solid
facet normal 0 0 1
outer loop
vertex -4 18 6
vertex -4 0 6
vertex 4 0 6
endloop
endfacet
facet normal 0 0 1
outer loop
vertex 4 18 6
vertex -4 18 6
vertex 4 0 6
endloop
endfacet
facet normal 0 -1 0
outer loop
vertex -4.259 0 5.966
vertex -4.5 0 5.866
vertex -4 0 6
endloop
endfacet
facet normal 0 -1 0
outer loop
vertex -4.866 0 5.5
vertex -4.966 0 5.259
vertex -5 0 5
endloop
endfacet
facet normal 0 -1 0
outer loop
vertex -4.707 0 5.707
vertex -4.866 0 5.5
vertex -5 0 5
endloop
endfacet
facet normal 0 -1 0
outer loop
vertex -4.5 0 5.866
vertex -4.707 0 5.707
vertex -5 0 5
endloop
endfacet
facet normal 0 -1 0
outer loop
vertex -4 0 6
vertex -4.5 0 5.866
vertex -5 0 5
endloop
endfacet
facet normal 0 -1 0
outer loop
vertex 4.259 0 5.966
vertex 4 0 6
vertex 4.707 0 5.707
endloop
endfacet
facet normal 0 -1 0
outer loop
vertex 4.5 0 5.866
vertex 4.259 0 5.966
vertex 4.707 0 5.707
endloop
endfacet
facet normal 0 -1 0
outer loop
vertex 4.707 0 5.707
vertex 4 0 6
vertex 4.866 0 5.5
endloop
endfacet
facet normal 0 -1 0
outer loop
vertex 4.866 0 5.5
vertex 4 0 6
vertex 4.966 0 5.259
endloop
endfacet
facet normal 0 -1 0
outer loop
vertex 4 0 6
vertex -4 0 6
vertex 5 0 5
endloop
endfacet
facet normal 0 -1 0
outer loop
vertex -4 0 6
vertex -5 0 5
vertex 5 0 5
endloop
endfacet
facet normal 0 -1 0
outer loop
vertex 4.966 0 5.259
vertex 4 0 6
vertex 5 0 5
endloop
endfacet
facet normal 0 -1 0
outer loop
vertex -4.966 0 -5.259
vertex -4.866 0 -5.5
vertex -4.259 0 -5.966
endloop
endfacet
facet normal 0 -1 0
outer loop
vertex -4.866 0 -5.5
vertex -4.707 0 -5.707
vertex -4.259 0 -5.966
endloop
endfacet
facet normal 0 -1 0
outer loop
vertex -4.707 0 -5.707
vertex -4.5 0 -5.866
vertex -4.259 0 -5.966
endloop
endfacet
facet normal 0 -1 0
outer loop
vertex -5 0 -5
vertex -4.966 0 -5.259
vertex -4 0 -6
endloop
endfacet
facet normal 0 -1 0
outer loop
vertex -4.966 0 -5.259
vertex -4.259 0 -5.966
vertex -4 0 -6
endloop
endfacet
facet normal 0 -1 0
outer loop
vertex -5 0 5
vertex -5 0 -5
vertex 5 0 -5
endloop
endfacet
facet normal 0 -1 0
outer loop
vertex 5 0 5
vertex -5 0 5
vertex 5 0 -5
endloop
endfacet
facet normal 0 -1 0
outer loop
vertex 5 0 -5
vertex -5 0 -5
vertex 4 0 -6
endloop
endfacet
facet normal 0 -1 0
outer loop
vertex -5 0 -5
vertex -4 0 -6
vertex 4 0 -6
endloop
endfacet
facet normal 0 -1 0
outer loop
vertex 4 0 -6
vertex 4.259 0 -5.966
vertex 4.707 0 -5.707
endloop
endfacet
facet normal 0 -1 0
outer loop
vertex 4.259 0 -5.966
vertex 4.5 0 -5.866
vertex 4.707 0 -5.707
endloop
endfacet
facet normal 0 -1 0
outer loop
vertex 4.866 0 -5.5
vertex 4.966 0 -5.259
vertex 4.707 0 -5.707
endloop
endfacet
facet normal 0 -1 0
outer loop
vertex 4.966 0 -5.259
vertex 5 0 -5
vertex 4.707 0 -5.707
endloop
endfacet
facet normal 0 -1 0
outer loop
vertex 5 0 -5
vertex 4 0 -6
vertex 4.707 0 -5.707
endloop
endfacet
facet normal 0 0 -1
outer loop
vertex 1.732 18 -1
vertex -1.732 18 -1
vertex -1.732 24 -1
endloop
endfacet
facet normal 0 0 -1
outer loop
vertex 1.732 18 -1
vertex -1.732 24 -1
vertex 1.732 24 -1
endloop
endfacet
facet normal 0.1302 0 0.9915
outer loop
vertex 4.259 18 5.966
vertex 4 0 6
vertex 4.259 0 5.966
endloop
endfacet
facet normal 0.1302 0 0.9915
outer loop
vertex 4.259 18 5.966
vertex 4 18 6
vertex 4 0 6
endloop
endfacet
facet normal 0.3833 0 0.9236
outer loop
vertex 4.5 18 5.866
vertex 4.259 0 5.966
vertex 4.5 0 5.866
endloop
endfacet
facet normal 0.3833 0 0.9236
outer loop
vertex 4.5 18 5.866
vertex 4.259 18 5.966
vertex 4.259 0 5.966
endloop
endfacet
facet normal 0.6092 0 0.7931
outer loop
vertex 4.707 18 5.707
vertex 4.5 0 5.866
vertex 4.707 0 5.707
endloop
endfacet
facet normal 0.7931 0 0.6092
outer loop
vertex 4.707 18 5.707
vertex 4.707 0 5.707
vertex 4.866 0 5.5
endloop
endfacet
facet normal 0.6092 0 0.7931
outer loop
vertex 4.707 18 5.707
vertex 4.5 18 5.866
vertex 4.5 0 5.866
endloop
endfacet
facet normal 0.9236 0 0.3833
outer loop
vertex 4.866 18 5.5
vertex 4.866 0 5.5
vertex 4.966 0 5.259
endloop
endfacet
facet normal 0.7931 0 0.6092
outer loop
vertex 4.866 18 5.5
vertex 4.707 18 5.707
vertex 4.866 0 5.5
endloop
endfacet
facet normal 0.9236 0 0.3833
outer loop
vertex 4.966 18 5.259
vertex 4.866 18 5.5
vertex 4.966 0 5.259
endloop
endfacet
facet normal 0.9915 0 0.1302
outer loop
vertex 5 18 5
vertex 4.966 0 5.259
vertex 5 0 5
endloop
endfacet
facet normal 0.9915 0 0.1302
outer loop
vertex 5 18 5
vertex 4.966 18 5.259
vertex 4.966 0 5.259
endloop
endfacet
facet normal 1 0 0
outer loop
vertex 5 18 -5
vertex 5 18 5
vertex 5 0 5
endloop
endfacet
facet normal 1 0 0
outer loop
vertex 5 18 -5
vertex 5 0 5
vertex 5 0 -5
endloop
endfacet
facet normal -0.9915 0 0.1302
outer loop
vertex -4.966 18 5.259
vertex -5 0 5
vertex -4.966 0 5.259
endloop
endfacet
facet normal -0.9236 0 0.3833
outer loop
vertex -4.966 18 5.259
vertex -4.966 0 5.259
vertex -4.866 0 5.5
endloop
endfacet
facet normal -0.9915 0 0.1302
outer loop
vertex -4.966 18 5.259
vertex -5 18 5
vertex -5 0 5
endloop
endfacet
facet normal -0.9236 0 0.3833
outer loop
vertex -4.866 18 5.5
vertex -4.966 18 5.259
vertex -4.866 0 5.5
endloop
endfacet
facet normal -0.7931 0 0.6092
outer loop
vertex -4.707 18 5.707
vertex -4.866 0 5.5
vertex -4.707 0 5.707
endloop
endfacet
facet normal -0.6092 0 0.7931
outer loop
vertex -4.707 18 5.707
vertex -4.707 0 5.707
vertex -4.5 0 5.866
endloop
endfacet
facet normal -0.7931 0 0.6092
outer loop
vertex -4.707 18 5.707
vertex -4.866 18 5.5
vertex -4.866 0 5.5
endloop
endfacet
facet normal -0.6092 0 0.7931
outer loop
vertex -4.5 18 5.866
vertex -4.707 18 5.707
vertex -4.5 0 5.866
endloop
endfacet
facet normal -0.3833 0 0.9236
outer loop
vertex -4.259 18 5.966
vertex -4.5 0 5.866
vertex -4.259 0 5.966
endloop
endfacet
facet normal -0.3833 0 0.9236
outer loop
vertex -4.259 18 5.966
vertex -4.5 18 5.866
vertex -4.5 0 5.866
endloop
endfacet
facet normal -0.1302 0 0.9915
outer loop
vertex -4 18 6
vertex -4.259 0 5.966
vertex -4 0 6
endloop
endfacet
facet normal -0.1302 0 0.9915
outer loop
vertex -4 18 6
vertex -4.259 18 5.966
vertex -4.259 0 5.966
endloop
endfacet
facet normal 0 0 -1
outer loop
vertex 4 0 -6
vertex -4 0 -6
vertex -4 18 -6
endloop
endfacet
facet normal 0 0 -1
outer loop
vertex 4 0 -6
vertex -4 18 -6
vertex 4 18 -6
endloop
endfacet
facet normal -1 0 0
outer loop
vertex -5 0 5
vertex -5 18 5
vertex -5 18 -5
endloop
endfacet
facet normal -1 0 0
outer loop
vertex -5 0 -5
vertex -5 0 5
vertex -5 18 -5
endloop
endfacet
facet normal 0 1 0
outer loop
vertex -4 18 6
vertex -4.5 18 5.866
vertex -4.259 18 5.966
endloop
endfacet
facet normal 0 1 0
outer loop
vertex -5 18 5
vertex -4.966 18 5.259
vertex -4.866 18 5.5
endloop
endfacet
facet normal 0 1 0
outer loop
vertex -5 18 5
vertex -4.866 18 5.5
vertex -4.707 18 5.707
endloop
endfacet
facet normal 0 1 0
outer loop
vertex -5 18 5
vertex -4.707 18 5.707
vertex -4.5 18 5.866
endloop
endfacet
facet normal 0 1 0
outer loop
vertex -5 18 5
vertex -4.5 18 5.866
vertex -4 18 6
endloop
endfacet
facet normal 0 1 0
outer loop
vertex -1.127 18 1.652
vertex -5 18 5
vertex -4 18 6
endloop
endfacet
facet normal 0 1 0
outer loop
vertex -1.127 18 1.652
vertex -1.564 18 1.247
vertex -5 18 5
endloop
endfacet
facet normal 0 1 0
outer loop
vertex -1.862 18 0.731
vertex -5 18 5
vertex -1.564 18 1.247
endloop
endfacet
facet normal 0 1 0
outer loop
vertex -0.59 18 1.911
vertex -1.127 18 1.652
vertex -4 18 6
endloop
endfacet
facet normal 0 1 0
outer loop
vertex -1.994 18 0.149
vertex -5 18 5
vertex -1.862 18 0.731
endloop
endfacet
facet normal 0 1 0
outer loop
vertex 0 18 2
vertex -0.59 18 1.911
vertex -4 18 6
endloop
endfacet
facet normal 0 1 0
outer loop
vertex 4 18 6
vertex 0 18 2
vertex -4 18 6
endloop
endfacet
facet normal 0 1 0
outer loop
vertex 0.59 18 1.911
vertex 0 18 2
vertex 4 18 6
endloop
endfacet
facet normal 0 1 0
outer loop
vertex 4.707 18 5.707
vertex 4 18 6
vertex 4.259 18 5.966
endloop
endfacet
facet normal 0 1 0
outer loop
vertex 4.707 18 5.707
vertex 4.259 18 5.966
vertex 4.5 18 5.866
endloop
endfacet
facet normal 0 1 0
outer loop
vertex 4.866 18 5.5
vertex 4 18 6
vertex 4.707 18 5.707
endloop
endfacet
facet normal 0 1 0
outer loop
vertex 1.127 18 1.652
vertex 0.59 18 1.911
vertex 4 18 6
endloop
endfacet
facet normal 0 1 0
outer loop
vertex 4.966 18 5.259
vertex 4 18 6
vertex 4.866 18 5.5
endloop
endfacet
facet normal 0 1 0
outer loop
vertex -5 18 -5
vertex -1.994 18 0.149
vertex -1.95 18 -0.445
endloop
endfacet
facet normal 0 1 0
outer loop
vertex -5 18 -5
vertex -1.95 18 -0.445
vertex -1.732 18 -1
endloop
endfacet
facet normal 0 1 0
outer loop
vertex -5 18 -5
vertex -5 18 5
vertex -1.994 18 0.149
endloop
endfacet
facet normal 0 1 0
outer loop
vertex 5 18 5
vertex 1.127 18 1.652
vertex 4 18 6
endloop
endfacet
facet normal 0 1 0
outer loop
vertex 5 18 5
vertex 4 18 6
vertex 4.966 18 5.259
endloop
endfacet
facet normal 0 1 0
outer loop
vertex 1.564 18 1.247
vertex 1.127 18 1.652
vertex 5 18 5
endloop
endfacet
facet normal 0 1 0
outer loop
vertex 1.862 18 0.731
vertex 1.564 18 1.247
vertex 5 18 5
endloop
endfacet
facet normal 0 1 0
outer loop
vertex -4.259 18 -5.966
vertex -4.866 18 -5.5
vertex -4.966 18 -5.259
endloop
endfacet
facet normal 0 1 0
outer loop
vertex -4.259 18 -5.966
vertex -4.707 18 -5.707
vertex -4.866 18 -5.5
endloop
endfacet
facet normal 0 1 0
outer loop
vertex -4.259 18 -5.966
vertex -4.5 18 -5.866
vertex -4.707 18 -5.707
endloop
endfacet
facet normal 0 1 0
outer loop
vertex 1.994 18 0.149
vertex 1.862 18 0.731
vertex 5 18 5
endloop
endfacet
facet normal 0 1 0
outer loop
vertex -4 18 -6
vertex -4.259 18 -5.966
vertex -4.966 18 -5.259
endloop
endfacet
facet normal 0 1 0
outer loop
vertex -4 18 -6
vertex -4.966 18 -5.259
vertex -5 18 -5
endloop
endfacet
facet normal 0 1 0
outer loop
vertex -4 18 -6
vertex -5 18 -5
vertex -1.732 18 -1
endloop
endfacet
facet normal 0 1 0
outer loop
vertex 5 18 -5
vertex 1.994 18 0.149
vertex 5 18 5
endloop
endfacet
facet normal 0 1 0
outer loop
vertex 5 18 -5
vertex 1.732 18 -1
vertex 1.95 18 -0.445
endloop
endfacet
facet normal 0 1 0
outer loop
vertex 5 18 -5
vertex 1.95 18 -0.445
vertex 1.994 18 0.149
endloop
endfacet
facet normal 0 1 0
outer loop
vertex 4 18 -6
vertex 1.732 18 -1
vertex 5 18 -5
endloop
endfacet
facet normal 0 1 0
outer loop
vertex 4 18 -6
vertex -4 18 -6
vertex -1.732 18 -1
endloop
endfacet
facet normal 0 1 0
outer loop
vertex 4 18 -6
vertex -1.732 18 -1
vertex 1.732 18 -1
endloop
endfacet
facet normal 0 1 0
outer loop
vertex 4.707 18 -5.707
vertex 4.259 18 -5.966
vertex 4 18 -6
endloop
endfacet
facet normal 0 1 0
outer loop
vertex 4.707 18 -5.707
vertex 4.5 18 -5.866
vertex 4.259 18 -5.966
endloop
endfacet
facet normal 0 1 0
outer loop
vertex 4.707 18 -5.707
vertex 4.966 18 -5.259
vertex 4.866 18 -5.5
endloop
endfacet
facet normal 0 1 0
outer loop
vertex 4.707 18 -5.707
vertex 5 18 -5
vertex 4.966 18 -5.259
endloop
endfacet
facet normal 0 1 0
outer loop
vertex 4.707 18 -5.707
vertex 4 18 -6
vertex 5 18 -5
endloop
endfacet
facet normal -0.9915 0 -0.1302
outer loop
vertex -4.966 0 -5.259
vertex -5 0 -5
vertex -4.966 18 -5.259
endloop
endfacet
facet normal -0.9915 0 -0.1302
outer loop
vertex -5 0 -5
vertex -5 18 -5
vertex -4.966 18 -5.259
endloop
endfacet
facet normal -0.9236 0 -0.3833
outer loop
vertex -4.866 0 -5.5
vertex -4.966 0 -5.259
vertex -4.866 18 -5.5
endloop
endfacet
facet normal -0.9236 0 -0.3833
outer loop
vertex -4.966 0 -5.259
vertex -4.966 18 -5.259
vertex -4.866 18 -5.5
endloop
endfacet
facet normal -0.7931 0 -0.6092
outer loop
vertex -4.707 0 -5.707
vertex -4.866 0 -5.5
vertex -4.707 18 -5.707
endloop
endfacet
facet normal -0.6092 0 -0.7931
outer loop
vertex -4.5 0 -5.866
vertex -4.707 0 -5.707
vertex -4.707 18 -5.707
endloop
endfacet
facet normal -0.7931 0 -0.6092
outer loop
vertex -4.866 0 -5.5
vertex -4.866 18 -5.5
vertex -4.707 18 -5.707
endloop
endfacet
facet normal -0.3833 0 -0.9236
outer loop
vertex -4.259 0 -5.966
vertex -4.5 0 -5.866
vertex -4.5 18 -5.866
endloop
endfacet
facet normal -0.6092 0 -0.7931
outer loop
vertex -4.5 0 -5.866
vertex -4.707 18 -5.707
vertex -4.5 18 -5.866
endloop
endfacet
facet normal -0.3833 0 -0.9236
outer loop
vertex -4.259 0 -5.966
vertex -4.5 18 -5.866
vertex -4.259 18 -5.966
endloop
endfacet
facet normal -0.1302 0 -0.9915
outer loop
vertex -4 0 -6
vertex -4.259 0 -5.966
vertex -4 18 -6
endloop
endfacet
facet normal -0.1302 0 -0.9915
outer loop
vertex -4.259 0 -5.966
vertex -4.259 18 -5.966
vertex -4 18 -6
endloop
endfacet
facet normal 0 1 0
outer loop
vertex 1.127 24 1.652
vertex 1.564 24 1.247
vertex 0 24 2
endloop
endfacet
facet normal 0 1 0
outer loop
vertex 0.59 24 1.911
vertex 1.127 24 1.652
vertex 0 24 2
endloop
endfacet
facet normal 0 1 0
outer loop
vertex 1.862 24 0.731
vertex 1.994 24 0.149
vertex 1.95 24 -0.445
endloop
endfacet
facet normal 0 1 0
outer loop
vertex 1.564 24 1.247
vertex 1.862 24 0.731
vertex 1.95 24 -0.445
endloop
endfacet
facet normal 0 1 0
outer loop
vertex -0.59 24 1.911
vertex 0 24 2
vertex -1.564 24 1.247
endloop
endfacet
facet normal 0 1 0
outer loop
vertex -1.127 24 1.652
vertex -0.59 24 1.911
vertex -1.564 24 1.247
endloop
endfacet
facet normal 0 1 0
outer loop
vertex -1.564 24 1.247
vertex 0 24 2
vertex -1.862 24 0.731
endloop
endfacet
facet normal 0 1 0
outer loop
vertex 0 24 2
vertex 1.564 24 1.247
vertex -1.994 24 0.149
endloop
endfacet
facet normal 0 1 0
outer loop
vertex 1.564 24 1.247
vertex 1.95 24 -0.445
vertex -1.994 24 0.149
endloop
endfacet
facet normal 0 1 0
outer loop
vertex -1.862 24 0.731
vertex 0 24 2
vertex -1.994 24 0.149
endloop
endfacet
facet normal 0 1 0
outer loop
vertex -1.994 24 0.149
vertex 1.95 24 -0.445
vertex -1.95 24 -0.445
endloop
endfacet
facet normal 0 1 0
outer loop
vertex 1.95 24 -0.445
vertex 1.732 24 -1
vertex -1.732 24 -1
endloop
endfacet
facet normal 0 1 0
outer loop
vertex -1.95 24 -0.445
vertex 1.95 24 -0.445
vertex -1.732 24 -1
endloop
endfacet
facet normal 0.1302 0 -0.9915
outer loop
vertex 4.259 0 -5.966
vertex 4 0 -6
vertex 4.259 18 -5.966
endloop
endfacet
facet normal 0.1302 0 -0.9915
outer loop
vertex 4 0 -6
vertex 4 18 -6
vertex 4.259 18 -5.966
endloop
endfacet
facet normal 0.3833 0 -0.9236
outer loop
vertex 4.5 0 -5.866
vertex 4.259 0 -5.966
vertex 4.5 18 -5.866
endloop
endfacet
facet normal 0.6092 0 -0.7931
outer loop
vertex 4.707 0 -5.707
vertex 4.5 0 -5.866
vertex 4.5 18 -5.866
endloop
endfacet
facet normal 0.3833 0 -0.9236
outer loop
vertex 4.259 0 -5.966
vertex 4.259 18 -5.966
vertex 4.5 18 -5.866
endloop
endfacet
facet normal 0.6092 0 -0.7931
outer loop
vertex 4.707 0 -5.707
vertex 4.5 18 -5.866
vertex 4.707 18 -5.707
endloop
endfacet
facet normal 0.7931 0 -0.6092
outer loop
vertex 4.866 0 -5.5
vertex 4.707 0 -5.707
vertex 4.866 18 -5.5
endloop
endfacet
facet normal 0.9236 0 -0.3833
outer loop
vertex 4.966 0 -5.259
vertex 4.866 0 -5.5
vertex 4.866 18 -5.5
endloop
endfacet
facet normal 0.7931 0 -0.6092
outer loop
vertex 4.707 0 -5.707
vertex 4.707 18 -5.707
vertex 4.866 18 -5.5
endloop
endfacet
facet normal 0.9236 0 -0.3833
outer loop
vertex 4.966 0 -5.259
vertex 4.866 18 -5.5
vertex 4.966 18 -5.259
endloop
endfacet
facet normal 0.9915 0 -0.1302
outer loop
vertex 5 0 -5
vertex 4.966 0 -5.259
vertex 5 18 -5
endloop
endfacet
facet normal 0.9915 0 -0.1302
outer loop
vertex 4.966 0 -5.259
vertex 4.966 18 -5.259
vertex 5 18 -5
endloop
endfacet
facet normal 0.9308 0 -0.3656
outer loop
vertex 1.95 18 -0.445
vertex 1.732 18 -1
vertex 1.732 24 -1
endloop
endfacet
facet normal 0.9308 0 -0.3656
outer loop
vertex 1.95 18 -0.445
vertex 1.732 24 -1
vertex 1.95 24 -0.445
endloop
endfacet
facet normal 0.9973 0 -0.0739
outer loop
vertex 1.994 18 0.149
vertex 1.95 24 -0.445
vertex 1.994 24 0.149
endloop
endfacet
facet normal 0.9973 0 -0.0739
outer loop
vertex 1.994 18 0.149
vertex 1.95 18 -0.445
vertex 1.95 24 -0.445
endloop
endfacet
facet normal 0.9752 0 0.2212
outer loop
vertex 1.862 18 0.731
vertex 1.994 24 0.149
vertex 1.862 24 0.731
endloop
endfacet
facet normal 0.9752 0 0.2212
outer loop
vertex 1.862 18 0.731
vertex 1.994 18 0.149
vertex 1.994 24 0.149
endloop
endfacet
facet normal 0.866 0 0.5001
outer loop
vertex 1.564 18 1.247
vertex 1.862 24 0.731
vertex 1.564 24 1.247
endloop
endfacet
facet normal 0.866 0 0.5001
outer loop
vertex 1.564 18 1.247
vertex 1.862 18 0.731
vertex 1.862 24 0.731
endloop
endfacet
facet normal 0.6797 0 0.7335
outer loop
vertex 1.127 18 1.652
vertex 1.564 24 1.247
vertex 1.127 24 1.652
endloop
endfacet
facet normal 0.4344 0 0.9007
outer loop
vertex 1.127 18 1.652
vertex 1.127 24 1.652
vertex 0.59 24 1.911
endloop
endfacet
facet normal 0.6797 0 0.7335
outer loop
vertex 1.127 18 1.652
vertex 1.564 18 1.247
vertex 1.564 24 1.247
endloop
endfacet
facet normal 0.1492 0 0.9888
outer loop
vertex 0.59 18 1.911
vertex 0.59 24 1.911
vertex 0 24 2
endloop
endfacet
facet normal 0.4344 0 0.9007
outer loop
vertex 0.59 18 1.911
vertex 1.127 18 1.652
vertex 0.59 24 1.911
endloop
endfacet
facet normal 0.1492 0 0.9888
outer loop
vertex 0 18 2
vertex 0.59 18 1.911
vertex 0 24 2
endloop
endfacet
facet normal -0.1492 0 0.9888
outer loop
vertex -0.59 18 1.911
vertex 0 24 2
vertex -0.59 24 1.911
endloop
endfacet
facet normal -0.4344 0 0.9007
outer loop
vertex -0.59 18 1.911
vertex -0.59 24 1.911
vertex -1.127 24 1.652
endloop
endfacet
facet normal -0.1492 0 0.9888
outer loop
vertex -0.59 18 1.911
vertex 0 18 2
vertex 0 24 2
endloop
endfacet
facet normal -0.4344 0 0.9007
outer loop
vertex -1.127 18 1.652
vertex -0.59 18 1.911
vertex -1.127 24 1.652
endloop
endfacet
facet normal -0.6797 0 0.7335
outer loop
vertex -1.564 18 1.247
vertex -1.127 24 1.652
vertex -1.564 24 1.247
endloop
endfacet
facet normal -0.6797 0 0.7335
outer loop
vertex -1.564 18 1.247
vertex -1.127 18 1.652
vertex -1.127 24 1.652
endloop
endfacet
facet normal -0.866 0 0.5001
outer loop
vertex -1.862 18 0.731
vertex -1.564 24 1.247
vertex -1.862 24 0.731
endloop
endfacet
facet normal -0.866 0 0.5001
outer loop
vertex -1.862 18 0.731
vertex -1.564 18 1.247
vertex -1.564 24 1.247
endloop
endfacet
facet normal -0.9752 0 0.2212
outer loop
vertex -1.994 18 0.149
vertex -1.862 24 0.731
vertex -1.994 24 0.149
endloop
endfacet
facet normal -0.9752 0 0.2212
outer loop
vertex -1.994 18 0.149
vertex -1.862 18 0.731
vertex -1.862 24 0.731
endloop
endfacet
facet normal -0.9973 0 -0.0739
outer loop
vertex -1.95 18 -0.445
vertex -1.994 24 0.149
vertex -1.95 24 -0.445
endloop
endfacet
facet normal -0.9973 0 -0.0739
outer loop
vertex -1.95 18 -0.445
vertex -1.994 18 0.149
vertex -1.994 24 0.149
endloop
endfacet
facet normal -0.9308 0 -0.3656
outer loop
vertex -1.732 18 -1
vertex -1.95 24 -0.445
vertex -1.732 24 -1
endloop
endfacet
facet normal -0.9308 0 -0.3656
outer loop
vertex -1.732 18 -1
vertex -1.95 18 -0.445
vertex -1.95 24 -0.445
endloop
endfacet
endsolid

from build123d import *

# Parameters (mm, degrees)
CROQUIS1_W              = 10
CROQUIS1_H              = 12
SALIENTE_EXTRUIR1_DEPTH = 18
SALIENTE_EXTRUIR2_DEPTH = 6
REDONDEO1_R             = 1


with BuildPart() as part:
    # Croquis1 → Saliente-Extruir1 (new body)
    with BuildSketch(Plane(origin=(0, 0, 0), x_dir=(1, 0, 0), z_dir=(0, 1, 0))):
        Rectangle(CROQUIS1_W, CROQUIS1_H)
    extrude(amount=SALIENTE_EXTRUIR1_DEPTH)

    # Croquis2 → Saliente-Extruir2 (add)
    with BuildSketch(Plane(origin=(0, 18, 0), x_dir=(1, 0, 0), z_dir=(0, 1, 0))):
        with BuildLine():
            Line((-1.732050808, 1), (1.732050808, 1))
            ThreePointArc((1.732050808, 1), (0, -2), (-1.732050808, 1))
        make_face()
    extrude(amount=SALIENTE_EXTRUIR2_DEPTH)

    # Redondeo1
    redondeo1_edges = [part.edges().sort_by_distance(p)[0] for p in [
        (5, 9, 6),
        (-5, 9, 6),
        (-5, 9, -6),
        (5, 9, -6),
    ]]
    fillet(redondeo1_edges, radius=REDONDEO1_R)


solid = part.part
